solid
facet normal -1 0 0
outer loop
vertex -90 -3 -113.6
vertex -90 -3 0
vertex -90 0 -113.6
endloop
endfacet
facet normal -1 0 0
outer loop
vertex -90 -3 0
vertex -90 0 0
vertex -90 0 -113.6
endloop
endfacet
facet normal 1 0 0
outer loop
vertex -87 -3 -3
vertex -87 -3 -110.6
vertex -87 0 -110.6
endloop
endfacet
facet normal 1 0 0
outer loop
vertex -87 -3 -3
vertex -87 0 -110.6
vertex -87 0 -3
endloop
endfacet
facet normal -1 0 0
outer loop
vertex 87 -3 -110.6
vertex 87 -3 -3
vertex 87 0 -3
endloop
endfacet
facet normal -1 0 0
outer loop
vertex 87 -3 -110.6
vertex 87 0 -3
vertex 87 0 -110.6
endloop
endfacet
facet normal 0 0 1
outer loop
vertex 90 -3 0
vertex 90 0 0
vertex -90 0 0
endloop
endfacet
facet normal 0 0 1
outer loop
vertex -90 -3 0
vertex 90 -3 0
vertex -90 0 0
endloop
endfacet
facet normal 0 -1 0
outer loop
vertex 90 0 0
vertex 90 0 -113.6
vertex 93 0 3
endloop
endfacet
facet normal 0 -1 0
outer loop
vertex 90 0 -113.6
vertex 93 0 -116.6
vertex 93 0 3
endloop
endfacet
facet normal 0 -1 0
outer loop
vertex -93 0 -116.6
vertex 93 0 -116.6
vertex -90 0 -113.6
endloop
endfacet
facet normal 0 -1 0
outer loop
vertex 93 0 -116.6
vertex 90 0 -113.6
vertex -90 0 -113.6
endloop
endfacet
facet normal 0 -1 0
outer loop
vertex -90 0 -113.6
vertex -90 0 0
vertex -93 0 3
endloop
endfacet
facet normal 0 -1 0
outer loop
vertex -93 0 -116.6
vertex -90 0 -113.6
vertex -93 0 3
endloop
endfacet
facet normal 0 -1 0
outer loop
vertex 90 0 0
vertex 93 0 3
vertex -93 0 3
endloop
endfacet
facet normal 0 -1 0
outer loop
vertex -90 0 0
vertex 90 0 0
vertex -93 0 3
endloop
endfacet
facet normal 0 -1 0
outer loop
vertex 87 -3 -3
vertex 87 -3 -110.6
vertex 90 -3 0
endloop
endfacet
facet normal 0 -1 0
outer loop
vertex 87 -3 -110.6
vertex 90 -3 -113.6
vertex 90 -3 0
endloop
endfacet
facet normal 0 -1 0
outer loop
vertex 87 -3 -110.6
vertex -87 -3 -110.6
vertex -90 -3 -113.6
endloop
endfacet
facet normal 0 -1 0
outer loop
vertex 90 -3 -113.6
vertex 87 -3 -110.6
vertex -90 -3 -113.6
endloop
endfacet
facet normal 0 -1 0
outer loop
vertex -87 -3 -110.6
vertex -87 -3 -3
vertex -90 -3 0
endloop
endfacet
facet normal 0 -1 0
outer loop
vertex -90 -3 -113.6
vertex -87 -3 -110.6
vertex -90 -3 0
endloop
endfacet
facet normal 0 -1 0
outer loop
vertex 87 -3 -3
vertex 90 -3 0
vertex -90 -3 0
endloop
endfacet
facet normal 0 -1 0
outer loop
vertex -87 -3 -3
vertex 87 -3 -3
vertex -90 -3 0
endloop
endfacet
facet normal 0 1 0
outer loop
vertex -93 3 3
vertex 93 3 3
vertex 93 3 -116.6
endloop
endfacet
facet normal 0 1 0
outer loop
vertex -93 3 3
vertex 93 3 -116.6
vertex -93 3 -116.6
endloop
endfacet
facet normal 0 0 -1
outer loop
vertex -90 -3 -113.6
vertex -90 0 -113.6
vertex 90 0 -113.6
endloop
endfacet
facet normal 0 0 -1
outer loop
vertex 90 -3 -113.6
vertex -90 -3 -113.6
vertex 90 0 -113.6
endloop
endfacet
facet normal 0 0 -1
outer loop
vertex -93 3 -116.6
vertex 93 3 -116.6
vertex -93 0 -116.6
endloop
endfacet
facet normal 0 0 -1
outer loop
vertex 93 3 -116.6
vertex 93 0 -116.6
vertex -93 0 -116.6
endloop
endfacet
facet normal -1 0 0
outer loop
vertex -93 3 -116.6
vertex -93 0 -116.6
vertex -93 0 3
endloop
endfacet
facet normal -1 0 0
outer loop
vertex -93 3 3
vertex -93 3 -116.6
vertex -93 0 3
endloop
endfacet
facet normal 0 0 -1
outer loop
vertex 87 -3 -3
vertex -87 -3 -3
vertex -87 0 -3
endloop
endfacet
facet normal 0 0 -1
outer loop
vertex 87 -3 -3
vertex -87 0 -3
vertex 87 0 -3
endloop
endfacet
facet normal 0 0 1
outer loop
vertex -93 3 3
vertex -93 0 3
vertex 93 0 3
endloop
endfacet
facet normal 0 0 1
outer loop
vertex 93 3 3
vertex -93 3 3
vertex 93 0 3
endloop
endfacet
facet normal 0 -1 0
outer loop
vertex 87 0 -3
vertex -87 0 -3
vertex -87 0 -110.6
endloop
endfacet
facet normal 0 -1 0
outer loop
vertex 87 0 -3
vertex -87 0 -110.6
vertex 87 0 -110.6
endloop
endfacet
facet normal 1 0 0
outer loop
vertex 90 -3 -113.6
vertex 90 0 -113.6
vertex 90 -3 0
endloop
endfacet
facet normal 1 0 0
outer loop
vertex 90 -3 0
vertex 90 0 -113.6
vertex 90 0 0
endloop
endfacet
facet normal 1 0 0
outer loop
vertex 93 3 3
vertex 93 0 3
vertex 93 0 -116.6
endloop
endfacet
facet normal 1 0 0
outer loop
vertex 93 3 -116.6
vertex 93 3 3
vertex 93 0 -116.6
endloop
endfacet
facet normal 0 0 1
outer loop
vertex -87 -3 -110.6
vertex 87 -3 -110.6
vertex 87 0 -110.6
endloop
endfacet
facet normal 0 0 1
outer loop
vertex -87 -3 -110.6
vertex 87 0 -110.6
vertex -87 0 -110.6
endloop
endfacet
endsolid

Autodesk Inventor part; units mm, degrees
ref_plane "YZ Plane" through (0, 0, 0) normal (1, 0, 0) x (0, 1, 0)
ref_plane "XZ Plane" through (0, 0, 0) normal (0, 1, 0) x (-1, 0, 0)
sketch "Sketch1" plane through (0, 0, 0) normal (0, 1, 0) x (-1, 0, 0)
  line L0 (90, -113.6) -> (-90, -113.6)
  line L1 (-90, -113.6) -> (-90, 0)
  line L2 (-90, 0) -> (90, 0)
  line L3 (90, 0) -> (90, -113.6)
  line L4 (-93, -116.6) -> (93, -116.6)
  line L5 (93, -116.6) -> (93, 3)
  line L6 (93, 3) -> (-93, 3)
  line L7 (-93, 3) -> (-93, -116.6)
  point P0 (0, 0)
  point P1 (0, 0)
  dimension "d0" = 180
  dimension "d1" = 113.6
  dimension "d2" = 3
extrude "Extrusion1" add sketch "Sketch1" along normal blind 3 contours L0 L1 L2 L3 | L7 L6 L5 L4
extrude "Extrusion2" add sketch "Sketch1" against normal blind 3 contours L0 L1 L2 L3
ref_plane "Work Plane1" through (-93, 0, -56.8) normal (0, 0, 1) x (1, 0, 0)
sketch "Sketch2" plane through (-93, 0, -56.8) normal (0, 0, 1) x (1, 0, 0)
  line L0 (0, 3) -> (186, 3) projected
  line L1 (159.34, 3) -> (146.166, 3)
  line L2 (146.166, 3) -> (142.9018, 10)
  line L3 (142.9018, 10) -> (162.6042, 10)
  line L4 (162.6042, 10) -> (159.34, 3)
  line L5 (119.506, 3) -> (106.332, 3)
  line L6 (106.332, 3) -> (103.0678, 10)
  line L7 (103.0678, 10) -> (122.7702, 10)
  line L8 (122.7702, 10) -> (119.506, 3)
  line L9 (93, 3) -> (93, -12.5812) construction
  line L10 (26.66, 3) -> (39.834, 3)
  line L11 (39.834, 3) -> (43.0982, 10)
  line L12 (43.0982, 10) -> (23.3958, 10)
  line L13 (23.3958, 10) -> (26.66, 3)
  line L14 (66.494, 3) -> (79.668, 3)
  line L15 (79.668, 3) -> (82.9322, 10)
  line L16 (82.9322, 10) -> (63.2298, 10)
  line L17 (63.2298, 10) -> (66.494, 3)
  point P0 (93, 0)
  point P1 (26.66, 3)
  point P2 (39.834, 3)
  point P3 (66.494, 3)
  point P4 (79.668, 3)
  dimension "d7" = 13.174
  dimension "d8" = 13.174
  dimension "d9" = 65
  dimension "d10" = 65
  dimension "d11" = 7
  dimension "d12" = 26.66
  dimension "d13" = 26.66
extrude "Extrusion3" [suppressed]
sketch "Sketch3" plane through (0, -3, 0) normal (0, -1, 0) x (1, 0, 0)
  line L0 (-87, -3) -> (87, -3)
  line L1 (87, -3) -> (87, -110.6)
  line L2 (87, -110.6) -> (-87, -110.6)
  line L3 (-87, -110.6) -> (-87, -3)
  line L4 (90, 0) -> (-90, 0) projected
  line L5 (-90, 0) -> (-90, -113.6) projected
  line L6 (-90, -113.6) -> (90, -113.6) projected
  line L7 (90, -113.6) -> (90, 0) projected
  point P0 (0, 0)
  dimension "d16" = 3
  dimension "d17" = 3
  dimension "d18" = 3
  dimension "d19" = 3
extrude "Extrusion4" cut sketch "Sketch3" against normal blind 3 contours L0 L1 L2 L3
properties part number "Lid"
